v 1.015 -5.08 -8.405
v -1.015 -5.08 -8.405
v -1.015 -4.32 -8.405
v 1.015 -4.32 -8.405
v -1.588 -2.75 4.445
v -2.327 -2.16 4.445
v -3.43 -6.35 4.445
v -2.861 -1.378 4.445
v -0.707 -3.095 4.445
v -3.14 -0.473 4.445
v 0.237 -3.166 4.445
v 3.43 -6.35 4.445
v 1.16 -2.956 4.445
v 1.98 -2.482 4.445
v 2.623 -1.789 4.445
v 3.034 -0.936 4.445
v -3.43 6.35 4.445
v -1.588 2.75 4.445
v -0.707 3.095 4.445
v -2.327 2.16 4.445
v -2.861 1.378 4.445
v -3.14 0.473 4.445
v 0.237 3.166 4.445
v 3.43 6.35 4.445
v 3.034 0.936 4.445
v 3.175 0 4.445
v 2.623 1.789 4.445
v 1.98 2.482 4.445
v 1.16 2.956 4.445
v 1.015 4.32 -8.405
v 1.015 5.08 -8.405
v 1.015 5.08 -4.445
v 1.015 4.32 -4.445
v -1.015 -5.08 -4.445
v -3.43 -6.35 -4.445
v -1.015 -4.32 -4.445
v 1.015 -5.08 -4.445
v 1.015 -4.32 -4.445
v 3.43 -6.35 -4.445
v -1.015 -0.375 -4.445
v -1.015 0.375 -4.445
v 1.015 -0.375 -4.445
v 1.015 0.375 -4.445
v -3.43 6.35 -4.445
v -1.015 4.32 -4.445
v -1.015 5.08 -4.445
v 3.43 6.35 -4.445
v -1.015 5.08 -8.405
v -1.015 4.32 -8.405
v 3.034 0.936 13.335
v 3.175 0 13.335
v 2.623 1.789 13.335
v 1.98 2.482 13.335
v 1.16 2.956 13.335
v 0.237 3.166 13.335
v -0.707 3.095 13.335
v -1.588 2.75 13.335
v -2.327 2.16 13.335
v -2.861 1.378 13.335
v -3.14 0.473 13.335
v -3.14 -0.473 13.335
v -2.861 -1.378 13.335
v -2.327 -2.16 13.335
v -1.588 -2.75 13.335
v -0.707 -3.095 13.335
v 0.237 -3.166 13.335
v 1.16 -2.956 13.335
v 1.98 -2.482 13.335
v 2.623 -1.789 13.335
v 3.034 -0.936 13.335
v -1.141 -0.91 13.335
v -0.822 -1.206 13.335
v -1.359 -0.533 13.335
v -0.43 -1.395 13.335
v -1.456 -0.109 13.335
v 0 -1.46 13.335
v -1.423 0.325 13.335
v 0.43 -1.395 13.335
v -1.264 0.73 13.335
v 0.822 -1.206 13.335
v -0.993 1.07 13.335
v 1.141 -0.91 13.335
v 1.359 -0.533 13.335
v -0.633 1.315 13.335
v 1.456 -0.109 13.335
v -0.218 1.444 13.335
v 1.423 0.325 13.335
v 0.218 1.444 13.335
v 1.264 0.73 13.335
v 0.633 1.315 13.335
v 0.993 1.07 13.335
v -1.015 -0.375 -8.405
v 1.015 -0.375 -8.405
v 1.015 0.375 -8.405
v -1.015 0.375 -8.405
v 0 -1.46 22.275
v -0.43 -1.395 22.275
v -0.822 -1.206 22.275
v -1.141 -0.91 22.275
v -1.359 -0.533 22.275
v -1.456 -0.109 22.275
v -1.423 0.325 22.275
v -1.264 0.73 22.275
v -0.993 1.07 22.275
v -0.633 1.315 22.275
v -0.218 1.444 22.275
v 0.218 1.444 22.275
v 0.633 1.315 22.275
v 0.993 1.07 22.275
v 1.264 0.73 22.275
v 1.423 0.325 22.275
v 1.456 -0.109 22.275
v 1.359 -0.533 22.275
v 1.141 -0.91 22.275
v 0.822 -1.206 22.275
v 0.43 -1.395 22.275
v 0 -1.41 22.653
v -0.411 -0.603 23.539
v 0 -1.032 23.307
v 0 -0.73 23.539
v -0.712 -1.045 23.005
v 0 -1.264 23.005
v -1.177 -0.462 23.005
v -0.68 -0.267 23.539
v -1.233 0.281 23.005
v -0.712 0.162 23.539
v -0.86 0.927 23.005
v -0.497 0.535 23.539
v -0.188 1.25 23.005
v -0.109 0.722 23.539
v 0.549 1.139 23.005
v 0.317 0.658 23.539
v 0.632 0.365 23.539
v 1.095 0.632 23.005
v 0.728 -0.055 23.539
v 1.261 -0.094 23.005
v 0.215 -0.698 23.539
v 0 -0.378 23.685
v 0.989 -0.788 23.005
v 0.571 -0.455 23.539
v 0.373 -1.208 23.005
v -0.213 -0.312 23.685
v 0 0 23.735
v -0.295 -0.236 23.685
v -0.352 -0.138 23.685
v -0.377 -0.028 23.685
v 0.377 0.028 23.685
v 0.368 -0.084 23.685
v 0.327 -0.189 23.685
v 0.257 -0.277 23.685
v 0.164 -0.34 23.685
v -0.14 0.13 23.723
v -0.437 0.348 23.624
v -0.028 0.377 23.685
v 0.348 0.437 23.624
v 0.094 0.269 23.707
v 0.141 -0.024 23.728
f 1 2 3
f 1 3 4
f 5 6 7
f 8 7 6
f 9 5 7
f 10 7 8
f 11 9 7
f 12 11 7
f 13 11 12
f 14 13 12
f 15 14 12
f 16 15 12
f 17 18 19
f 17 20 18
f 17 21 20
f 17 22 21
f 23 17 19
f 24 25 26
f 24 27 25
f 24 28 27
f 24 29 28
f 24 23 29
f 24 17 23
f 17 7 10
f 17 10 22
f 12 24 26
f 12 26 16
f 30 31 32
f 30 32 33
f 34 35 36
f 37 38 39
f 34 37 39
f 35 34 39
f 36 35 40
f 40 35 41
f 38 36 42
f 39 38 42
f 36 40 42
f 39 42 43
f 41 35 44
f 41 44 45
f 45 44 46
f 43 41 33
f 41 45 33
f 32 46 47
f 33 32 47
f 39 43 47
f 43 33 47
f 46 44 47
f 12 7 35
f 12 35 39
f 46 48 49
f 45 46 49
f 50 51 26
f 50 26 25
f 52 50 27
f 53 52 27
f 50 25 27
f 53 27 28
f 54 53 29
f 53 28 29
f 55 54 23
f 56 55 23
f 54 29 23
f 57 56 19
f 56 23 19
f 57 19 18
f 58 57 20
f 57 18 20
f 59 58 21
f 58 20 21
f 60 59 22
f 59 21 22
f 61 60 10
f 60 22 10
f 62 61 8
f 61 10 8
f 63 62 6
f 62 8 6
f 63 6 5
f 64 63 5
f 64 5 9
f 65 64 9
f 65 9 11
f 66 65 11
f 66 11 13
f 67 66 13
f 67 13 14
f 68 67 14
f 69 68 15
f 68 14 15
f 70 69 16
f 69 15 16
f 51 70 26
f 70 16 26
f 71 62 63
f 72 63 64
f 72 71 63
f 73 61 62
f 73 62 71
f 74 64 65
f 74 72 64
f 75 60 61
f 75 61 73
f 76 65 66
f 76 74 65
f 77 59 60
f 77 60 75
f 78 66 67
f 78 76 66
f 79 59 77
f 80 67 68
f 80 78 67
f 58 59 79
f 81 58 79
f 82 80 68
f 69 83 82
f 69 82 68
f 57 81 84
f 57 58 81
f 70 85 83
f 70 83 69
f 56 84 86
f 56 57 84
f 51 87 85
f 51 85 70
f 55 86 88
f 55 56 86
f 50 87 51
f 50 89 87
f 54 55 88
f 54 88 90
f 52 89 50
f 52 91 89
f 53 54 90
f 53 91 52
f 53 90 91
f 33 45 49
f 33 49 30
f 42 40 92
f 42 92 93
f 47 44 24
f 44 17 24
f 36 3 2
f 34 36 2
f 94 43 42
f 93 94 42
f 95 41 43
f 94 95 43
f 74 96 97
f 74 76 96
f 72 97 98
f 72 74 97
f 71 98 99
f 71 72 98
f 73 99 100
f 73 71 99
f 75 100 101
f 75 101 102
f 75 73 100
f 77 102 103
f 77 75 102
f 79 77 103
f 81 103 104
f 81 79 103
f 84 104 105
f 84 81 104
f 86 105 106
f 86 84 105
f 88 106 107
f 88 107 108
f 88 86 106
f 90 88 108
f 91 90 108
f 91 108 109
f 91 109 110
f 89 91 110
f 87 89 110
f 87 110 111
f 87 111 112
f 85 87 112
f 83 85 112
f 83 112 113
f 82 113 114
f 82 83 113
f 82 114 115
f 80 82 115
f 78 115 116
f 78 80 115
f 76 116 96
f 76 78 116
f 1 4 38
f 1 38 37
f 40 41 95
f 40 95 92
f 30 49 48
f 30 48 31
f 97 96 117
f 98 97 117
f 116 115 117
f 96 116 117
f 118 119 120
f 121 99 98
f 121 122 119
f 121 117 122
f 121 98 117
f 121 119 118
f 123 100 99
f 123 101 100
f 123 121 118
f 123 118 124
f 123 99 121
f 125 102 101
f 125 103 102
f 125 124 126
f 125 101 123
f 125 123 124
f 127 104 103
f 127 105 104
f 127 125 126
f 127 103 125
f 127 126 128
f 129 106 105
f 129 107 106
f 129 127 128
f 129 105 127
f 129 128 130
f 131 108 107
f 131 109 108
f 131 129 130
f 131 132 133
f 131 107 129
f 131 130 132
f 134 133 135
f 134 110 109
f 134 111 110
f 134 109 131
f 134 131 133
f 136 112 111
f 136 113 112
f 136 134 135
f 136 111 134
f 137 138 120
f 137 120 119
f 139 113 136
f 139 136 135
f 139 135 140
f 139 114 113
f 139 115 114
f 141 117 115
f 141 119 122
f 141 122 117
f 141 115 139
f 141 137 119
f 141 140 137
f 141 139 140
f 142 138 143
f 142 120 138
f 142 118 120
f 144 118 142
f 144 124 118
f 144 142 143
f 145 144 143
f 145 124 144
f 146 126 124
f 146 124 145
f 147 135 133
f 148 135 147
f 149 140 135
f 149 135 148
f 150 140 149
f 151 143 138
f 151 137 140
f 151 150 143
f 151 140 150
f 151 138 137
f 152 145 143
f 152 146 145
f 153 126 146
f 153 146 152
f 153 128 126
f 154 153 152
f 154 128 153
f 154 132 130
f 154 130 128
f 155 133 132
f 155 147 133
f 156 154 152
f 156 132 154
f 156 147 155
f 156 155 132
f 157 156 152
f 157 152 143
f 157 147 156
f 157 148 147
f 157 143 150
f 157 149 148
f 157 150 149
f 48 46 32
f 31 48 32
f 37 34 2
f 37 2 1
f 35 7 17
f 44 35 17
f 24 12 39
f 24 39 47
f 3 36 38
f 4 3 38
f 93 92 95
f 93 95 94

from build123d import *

# Parameters (mm, degrees)
F0_W     = 6.86
F0_H     = 12.7
F1_DEPTH = 4.445
F2_R     = 3.175
F3_DEPTH = 8.89
F4_W     = 2.03
F4_H     = 0.75
F4_H_2   = 0.76
F5_DEPTH = 3.96


with BuildPart() as f1:
    # F0 (on Top) → F1 (new body, symmetric)
    with BuildSketch(Plane.XY):
        Rectangle(F0_W, F0_H)
    extrude(amount=F1_DEPTH, both=True)

    # F2 (on face) → F3 (join)
    with BuildSketch(Plane.XY.offset(4.445)):
        Circle(F2_R)
    extrude(amount=F3_DEPTH)

    # F4 (on face) → F5 (join)
    with BuildSketch(Plane(origin=(0, 0, -4.445), x_dir=(1, 0, 0), z_dir=(0, 0, -1))):
        Rectangle(F4_W, F4_H)
        with Locations((0, -4.7)):
            Rectangle(F4_W, F4_H_2)
        with Locations((0, 4.7)):
            Rectangle(F4_W, F4_H_2)
    extrude(amount=F5_DEPTH)

    # F6 (on Right) → F7 (revolve)
    with BuildSketch(Plane.YZ):
        with BuildLine():
            Line((-1.46, 22.275), (-1.46, 13.335))
            Line((-1.46, 13.335), (0, 13.335))
            Line((0, 13.335), (0, 23.735))
            ThreePointArc((0, 23.735), (-1.032376, 23.307376), (-1.46, 22.275))
        make_face()
    revolve(axis=Axis((0, 0, 18.535), (0, 0, -1)))


solid = f1.part
